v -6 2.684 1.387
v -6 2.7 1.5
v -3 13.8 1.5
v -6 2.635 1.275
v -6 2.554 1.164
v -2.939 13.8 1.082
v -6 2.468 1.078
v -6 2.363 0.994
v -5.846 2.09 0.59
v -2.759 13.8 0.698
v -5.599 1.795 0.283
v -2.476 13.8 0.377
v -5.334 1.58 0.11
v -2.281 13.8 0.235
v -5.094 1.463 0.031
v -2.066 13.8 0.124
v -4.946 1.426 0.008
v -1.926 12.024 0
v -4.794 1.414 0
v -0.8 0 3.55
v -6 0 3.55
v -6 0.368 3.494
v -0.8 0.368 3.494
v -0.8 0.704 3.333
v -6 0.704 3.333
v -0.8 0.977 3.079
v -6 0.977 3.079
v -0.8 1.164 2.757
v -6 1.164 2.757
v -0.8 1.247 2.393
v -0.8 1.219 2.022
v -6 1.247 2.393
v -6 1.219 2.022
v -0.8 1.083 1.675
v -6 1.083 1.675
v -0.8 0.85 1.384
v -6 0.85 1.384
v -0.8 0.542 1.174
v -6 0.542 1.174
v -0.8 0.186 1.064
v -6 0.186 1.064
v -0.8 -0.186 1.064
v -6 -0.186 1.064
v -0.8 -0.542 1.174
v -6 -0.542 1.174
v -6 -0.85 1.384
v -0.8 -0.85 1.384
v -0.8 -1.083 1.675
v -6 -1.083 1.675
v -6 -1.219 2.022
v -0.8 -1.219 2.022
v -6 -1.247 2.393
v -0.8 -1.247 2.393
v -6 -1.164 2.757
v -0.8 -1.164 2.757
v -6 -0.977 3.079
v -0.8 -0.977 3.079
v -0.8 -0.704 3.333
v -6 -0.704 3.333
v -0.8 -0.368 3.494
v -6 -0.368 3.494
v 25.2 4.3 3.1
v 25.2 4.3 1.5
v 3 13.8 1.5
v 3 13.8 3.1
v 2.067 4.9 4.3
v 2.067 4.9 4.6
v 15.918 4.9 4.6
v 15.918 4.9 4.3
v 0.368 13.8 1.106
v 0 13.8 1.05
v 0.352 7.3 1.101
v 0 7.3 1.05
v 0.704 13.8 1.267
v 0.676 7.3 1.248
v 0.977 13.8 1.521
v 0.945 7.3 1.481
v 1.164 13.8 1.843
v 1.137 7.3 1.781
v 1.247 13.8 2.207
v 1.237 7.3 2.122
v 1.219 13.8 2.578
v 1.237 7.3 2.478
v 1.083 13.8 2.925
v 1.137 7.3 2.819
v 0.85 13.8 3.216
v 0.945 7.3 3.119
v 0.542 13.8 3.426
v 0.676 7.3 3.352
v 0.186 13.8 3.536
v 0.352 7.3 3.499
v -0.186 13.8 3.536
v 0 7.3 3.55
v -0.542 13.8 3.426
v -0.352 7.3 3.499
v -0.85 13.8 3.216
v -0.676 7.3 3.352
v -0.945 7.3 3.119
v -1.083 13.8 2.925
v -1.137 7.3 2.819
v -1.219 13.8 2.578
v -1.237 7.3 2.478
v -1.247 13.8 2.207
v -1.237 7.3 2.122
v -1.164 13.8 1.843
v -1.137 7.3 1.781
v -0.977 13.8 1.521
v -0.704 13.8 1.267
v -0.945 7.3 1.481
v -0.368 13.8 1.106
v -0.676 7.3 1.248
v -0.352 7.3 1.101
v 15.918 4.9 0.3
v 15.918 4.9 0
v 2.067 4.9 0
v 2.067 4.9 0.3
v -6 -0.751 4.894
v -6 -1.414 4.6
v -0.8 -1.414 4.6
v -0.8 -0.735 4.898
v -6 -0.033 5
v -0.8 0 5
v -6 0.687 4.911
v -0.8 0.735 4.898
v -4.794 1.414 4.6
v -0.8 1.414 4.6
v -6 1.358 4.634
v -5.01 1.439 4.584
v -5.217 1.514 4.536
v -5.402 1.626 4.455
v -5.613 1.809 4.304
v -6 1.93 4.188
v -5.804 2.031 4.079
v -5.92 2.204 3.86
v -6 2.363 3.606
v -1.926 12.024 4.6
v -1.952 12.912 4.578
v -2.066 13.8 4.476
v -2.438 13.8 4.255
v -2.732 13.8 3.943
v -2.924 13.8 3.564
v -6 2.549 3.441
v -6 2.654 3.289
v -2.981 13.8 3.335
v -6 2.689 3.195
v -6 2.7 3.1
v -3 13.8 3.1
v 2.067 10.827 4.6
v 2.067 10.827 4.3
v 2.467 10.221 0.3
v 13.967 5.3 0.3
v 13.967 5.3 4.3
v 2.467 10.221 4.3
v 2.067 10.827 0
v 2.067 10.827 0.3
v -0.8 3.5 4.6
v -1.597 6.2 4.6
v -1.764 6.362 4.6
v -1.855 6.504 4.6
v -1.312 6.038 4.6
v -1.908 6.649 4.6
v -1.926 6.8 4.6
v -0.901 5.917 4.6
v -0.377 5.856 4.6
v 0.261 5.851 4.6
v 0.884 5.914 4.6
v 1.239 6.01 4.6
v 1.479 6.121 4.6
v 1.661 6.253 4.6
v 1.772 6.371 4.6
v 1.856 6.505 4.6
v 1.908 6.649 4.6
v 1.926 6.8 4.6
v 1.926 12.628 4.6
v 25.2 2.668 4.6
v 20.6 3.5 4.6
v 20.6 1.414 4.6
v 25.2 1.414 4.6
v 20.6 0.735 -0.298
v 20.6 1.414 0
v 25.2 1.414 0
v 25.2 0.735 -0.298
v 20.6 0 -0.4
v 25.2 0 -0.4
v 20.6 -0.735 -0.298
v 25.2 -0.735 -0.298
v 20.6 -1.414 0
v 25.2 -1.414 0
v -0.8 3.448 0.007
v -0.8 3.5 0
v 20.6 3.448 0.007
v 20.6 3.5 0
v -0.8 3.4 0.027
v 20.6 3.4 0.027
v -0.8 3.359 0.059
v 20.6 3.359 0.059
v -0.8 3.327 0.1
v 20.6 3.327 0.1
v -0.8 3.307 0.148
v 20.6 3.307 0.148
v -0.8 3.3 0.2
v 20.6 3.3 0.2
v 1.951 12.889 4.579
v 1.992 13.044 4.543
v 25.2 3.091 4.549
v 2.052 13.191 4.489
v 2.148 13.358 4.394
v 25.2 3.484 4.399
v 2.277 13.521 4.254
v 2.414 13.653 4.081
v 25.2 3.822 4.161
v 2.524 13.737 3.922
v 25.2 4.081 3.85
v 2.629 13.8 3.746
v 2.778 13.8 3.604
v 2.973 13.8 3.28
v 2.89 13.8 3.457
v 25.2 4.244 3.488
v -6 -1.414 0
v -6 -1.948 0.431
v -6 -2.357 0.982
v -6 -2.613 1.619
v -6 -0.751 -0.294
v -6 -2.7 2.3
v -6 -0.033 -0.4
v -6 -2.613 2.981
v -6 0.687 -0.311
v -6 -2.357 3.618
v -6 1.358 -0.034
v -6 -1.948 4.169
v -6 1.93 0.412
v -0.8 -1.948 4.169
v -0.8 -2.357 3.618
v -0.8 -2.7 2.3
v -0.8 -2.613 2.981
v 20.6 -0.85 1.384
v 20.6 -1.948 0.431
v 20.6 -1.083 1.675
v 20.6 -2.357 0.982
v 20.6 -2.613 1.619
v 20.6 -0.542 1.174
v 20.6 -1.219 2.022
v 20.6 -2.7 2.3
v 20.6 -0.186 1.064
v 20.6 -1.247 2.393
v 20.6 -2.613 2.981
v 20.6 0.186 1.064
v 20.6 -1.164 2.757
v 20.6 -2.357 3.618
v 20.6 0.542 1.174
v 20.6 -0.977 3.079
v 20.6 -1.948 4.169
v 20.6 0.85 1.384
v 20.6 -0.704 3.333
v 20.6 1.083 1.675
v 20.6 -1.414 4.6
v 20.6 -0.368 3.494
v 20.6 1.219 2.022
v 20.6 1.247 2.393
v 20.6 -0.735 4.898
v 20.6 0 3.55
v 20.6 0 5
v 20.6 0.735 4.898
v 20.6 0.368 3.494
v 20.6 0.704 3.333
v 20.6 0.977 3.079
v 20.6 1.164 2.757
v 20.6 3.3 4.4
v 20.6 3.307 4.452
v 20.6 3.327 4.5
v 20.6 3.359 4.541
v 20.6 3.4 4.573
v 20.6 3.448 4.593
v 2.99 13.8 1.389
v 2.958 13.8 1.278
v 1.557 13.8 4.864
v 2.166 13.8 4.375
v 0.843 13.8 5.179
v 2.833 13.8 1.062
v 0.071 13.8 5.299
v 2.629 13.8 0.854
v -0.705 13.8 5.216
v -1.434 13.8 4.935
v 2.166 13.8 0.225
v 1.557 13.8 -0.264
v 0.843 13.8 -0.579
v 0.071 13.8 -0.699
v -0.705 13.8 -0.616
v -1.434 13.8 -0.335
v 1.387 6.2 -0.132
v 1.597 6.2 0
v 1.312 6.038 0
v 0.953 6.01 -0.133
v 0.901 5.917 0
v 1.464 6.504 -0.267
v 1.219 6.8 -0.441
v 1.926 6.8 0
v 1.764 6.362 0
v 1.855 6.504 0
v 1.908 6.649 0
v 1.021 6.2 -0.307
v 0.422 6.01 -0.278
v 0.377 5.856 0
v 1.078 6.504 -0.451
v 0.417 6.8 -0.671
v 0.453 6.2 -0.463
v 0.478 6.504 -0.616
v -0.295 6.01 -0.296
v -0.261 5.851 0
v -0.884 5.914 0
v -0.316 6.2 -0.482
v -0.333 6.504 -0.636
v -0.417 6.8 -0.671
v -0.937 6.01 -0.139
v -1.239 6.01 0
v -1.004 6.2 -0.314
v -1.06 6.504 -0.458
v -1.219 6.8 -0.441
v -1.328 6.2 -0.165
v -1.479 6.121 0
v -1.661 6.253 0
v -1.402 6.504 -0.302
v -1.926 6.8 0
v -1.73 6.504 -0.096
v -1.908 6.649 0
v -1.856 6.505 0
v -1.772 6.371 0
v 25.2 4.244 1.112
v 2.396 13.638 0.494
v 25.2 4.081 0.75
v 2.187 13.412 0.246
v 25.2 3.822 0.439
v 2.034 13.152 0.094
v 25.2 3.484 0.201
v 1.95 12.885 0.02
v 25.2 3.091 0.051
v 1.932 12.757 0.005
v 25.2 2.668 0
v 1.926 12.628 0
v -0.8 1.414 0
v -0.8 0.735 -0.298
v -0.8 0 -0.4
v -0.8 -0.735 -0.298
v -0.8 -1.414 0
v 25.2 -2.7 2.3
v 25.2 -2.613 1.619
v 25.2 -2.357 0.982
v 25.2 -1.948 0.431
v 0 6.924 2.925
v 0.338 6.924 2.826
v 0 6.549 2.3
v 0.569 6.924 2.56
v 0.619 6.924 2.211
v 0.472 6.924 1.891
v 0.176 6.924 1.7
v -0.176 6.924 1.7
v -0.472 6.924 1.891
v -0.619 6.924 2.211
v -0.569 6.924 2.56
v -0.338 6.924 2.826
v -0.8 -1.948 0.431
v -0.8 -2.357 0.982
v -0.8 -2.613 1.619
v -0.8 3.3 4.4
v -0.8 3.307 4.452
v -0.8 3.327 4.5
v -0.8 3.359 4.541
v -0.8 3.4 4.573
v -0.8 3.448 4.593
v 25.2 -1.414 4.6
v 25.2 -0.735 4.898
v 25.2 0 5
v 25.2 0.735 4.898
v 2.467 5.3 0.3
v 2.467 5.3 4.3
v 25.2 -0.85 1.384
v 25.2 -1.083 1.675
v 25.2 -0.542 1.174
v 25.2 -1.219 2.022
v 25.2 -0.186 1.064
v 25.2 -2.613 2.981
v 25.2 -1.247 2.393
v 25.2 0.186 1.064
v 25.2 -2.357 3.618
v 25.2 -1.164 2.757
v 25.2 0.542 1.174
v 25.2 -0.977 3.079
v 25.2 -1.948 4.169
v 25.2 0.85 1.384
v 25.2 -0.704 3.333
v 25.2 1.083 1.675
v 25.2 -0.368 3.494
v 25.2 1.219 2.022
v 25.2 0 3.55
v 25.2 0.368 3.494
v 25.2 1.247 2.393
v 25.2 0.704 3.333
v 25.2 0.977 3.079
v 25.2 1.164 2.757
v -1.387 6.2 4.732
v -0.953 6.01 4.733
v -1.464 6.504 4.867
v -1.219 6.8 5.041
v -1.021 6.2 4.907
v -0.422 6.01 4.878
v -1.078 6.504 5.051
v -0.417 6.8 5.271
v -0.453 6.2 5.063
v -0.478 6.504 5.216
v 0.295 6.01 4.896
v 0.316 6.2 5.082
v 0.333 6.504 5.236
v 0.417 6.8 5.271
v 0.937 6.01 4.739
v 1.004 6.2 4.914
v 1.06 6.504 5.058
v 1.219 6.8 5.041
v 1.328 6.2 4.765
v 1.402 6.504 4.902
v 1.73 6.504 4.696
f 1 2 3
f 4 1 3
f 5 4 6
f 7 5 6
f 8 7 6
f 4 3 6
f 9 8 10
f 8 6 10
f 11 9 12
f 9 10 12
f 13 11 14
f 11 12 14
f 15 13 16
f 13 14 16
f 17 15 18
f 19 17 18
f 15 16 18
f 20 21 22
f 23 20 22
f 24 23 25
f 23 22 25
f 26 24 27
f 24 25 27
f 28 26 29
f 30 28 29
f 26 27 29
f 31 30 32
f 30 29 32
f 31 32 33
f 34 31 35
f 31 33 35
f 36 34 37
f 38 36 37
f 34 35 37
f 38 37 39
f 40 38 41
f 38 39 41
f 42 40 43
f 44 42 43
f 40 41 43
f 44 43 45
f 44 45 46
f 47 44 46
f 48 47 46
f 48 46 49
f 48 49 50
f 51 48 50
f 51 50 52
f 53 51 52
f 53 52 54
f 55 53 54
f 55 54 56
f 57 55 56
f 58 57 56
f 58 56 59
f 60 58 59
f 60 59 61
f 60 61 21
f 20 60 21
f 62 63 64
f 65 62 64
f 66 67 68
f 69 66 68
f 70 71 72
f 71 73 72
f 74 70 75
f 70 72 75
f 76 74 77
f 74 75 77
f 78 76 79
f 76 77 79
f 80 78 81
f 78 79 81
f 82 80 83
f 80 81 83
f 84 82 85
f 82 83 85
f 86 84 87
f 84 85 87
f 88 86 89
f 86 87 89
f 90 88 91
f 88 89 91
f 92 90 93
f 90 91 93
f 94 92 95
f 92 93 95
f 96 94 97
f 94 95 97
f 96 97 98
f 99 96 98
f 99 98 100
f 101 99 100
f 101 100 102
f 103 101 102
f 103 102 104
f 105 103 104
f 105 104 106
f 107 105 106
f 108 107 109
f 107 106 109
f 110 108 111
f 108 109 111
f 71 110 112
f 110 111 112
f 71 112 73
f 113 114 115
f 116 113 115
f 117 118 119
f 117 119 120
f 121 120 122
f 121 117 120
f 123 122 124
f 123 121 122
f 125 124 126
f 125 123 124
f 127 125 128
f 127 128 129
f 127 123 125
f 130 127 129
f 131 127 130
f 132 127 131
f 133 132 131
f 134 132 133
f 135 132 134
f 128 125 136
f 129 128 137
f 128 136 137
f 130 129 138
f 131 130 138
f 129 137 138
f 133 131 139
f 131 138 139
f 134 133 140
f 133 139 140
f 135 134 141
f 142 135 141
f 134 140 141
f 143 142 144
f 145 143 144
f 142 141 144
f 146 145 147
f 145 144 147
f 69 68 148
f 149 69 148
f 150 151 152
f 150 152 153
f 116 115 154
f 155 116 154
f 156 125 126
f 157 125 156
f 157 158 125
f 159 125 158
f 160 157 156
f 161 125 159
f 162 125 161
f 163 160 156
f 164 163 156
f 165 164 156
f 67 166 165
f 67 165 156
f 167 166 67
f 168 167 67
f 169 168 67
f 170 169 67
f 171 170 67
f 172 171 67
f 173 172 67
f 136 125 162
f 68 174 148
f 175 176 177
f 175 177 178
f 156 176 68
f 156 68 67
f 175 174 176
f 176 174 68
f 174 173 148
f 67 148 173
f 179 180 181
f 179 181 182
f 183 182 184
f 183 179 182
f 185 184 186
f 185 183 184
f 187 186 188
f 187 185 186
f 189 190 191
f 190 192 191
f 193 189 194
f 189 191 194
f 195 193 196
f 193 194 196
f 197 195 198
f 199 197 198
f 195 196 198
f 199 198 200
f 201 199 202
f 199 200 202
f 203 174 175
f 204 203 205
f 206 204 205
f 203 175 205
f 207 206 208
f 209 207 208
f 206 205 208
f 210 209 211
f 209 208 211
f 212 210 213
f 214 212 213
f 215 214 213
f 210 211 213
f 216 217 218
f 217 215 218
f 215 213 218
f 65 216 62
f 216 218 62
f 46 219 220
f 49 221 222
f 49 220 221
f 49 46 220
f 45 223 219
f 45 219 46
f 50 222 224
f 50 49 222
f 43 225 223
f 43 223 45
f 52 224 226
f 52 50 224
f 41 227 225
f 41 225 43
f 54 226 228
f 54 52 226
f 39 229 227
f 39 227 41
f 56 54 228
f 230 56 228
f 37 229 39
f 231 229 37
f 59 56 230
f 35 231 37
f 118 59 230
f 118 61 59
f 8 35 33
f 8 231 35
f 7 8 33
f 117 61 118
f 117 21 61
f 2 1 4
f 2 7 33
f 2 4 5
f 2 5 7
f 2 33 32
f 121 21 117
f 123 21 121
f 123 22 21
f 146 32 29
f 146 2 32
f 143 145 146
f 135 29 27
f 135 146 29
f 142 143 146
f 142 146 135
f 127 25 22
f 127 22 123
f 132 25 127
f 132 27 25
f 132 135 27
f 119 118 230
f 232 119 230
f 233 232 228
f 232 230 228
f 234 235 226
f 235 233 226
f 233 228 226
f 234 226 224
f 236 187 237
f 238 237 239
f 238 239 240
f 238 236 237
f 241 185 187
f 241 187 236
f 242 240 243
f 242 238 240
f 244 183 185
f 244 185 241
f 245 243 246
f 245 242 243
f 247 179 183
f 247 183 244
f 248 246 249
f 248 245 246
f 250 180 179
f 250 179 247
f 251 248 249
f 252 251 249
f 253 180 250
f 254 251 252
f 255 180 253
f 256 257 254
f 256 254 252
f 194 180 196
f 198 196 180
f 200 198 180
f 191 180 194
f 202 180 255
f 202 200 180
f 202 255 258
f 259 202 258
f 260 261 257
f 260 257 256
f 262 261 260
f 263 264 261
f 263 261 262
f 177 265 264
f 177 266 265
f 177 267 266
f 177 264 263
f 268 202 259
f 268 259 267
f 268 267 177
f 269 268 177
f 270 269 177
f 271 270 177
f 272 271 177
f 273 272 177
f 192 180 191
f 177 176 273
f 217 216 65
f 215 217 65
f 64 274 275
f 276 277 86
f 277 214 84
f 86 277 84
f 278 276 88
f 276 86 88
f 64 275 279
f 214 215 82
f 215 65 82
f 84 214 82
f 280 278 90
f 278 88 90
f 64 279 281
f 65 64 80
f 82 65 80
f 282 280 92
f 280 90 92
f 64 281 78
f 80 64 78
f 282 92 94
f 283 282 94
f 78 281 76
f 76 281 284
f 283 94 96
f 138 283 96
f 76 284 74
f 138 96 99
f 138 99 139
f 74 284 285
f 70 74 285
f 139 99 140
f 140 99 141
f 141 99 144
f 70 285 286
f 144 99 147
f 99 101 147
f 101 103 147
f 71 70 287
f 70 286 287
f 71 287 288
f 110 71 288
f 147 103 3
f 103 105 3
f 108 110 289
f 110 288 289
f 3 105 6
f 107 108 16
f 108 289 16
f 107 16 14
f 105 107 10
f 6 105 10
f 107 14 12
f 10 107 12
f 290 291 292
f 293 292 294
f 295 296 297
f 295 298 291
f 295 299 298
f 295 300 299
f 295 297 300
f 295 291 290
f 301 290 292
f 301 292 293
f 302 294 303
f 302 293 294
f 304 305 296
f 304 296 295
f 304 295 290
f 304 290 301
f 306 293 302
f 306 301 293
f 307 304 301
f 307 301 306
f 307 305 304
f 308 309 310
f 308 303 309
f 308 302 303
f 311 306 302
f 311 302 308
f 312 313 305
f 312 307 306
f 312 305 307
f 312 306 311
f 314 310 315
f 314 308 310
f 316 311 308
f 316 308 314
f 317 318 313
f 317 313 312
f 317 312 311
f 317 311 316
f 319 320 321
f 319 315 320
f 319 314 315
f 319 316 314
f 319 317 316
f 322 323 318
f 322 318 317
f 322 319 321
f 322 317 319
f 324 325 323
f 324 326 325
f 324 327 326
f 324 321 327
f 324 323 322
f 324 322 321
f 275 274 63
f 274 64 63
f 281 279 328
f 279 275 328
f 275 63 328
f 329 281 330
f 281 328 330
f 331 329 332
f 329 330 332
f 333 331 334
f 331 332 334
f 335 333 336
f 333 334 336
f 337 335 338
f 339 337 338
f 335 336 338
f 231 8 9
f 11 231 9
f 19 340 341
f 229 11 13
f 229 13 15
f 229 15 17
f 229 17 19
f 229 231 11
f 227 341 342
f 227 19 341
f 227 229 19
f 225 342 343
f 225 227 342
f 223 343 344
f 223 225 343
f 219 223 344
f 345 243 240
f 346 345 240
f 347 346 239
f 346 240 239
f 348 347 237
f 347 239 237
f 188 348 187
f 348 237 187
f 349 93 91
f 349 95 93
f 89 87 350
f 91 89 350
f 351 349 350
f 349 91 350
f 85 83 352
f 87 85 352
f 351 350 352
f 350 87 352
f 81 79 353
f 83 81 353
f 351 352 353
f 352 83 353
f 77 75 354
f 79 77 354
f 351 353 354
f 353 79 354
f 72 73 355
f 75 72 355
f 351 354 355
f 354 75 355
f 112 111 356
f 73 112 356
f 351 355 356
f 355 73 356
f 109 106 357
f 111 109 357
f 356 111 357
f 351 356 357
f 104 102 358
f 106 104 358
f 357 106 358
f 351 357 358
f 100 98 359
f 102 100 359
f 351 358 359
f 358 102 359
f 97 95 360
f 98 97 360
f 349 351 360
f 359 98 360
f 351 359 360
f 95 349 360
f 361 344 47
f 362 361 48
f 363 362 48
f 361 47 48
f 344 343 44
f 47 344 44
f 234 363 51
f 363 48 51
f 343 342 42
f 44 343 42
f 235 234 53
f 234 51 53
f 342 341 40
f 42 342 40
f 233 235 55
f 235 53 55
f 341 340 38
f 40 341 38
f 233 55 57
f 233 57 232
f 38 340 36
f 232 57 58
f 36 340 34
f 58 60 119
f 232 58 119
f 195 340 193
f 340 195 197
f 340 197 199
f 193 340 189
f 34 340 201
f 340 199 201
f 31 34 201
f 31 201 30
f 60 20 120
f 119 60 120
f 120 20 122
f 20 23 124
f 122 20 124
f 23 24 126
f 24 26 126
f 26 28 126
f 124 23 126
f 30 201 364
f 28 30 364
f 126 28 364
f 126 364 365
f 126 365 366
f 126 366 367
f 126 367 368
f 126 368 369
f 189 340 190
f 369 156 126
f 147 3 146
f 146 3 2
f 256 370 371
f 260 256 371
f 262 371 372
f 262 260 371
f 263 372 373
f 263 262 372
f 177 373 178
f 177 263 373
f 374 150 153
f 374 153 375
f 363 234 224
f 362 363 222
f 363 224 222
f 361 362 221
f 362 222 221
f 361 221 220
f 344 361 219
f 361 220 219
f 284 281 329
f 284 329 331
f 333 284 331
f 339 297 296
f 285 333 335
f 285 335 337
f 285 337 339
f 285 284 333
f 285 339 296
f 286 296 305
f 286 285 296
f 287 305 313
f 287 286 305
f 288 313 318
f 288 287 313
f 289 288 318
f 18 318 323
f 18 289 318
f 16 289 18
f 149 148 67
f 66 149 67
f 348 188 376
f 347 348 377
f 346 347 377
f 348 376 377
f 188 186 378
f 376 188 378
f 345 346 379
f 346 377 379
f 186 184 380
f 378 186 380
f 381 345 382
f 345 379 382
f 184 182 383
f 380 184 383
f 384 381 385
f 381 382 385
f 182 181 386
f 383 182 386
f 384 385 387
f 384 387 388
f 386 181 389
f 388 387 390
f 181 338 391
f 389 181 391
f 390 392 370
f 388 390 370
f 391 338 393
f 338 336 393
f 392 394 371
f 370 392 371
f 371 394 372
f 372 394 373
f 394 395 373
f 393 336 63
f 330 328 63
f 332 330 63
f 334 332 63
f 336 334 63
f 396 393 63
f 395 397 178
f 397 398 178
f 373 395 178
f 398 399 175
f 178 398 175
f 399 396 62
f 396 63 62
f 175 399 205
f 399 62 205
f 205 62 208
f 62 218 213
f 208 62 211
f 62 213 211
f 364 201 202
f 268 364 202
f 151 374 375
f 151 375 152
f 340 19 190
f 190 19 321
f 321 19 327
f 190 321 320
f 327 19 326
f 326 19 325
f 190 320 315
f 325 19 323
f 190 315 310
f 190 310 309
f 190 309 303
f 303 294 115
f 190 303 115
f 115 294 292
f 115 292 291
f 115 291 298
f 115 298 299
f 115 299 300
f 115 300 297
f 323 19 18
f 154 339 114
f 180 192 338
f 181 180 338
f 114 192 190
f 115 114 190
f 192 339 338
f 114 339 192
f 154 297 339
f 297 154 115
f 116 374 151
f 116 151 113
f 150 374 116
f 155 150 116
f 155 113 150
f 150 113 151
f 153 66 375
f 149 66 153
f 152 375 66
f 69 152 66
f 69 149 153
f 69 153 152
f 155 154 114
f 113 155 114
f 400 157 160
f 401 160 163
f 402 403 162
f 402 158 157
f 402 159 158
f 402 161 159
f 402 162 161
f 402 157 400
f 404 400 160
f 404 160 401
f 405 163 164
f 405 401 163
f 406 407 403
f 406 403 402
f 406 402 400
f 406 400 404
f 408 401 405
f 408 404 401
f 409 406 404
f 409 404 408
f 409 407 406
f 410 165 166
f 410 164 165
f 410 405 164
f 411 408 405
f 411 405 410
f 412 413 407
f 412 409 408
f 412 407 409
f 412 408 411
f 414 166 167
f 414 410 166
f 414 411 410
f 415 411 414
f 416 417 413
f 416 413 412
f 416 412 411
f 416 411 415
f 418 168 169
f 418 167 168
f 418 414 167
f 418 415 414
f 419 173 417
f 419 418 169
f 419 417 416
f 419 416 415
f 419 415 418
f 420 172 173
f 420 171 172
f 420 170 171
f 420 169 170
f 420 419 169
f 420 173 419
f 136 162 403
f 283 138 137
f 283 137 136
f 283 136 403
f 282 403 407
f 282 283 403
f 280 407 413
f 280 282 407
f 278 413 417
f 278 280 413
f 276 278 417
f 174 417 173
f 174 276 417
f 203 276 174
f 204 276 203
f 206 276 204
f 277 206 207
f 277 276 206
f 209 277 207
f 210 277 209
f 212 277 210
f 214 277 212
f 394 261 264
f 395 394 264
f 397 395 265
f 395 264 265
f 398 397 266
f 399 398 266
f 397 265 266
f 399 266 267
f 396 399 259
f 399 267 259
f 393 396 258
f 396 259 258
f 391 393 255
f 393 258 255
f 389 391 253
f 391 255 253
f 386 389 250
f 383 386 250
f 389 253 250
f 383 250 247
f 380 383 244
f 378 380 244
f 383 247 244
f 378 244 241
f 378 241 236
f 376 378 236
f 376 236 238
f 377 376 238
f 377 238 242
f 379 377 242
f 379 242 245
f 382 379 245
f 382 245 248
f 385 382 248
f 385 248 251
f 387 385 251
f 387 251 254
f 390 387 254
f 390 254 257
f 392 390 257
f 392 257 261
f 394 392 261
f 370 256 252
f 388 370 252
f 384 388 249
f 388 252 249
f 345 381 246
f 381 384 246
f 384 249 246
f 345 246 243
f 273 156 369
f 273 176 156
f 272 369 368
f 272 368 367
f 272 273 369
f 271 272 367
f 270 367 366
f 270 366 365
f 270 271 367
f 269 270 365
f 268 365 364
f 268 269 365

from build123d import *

# Parameters (mm, degrees)
EXTRUDE_1_DEPTH        = 4.6
SKETCH_2_R             = 3
EXTRUDE_2_DEPTH        = 8
SKETCH_3_R             = 2.7
EXTRUDE_3_DEPTH        = 5.2
SKETCH_5_R             = 2.7
EXTRUDE_4_DEPTH        = 4.6
CUT_EXTRUDE_1_DEPTH    = 35.524918537
FILLET_1_R             = 1.5
CUT_EXTRUDE_2_DEPTH    = 30.215920451
CUT_EXTRUDE_3_DEPTH    = 0.3
CUT_EXTRUDE_4_DEPTH    = 0.3
FILLET_2_R             = 0.2
FILLET_3_R             = 1
SKETCH_9_R             = 1.25
CUT_EXTRUDE_5_DEPTH    = 35.524918683
HOLE_WIZARD_M3_1_D     = 2.5
HOLE_WIZARD_M3_1_DEPTH = 6.5
HOLE_WIZARD_M3_1_TIP   = 0.751075774


with BuildPart() as part:
    # 草图1 → 凸台-拉伸1 (new body)
    with BuildSketch(Plane.XY):
        Polygon((-0.8, -2.7), (-0.8, 3.3), (20.6, 3.3), (20.6, -2.7), (25.2, -2.7), (25.2, 4.3), (3, 13.8), (-3, 13.8), (-6, 2.7), (-6, -2.7), align=None)
        Polygon((2.46680021, 10.221171171), (2.46680021, 5.3), (13.96680021, 5.3), align=None, mode=Mode.SUBTRACT)
    extrude(amount=EXTRUDE_1_DEPTH)

    # 草图2 → 凸台-拉伸2 (add)
    with BuildSketch(Plane(origin=(0, 13.8, 0), x_dir=(1, 0, 0), z_dir=(0, 1, 0))):
        with Locations((0, -2.3)):
            Circle(SKETCH_2_R)
    extrude(amount=-EXTRUDE_2_DEPTH)

    # 草图3 → 凸台-拉伸3 (add)
    with BuildSketch(Plane.ZY.offset(6)):
        with Locations((2.3, 0)):
            Circle(SKETCH_3_R)
    extrude(amount=-EXTRUDE_3_DEPTH)

    # 草图5 → 凸台-拉伸4 (add)
    with BuildSketch(Plane.ZY.offset(-20.6)):
        with Locations((2.3, 0)):
            Circle(SKETCH_5_R)
    extrude(amount=-EXTRUDE_4_DEPTH)

    # 草图4 → 切除-拉伸1 (cut, through all)
    with BuildSketch(Plane.ZY.offset(6)):
        with BuildLine():
            ThreePointArc((4.6, -1.414213562), (3.617502065, -2.356732549), (2.3, -2.7))
            Line((2.3, -2.7), (4.6, -2.7))
            Line((4.6, -2.7), (4.6, -1.414213562))
        make_face()
        with BuildLine():
            ThreePointArc((2.3, -2.7), (0.982497935, -2.356732549), (0, -1.414213562))
            Line((0, -1.414213562), (0, -2.7))
            Line((0, -2.7), (2.3, -2.7))
        make_face()
    extrude(amount=-CUT_EXTRUDE_1_DEPTH, mode=Mode.SUBTRACT)

    # 圆角1
    # the kernel refuses this fillet: 1.5 mm, written as the material it takes off along each edge
    with BuildSketch(Plane(origin=(-2.021591156, 17.420112724, 0), x_dir=(0.9653633930282662, -0.26090902514277475, 0), z_dir=(-0.2609090251427748, -0.9653633930282663, 0))) as fillet_1_piece_1_section:
        with BuildLine():
            CenterArc((FILLET_1_R, FILLET_1_R), FILLET_1_R, 180, 90)
            Line((0, FILLET_1_R), (0, 0))
            Line((0, 0), (FILLET_1_R, 0))
        make_face()
    fillet_1_piece_1 = extrude(amount=18.998260738, mode=Mode.PRIVATE)
    fillet_1_piece_1 = fillet_1_piece_1 - Plane(origin=(-4.247071053, 0, 2.3), x_dir=(0, 0, 1), z_dir=(-1, 0, 0)) * Cylinder(2.7, 44, mode=Mode.PRIVATE)
    fillet_1_piece_1 = fillet_1_piece_1 - Plane(origin=(0, 7.876054914, 2.3), x_dir=(1, 0, 0), z_dir=(0, 1, 0)) * Cylinder(3, 44, mode=Mode.PRIVATE)
    add(fillet_1_piece_1, mode=Mode.SUBTRACT)
    with BuildSketch(Plane(origin=(-2.021591156, 17.420112724, 4.6), x_dir=(0.9653633930282662, -0.26090902514277475, 0), z_dir=(-0.2609090251427748, -0.9653633930282663, 0))) as fillet_1_piece_2_section:
        with BuildLine():
            CenterArc((FILLET_1_R, -FILLET_1_R), FILLET_1_R, 90, 90)
            Line((0, -FILLET_1_R), (0, 0))
            Line((0, 0), (FILLET_1_R, 0))
        make_face()
    fillet_1_piece_2 = extrude(amount=18.998260738, mode=Mode.PRIVATE)
    fillet_1_piece_2 = fillet_1_piece_2 - Plane(origin=(-4.247069139, 0, 2.3), x_dir=(0, 0, 1), z_dir=(-1, 0, 0)) * Cylinder(2.7, 44, mode=Mode.PRIVATE)
    fillet_1_piece_2 = fillet_1_piece_2 - Plane(origin=(0, 7.876066276, 2.3), x_dir=(1, 0, 0), z_dir=(0, 1, 0)) * Cylinder(3, 44, mode=Mode.PRIVATE)
    add(fillet_1_piece_2, mode=Mode.SUBTRACT)
    with BuildSketch(Plane(origin=(28.647596614, 2.824677125, 0), x_dir=(-0.39341943343746105, -0.9193590970854355, 0), z_dir=(-0.9193590970854355, 0.39341943343746105, 0))) as fillet_1_piece_3_section:
        with BuildLine():
            CenterArc((FILLET_1_R, FILLET_1_R), FILLET_1_R, 180, 90)
            Line((0, FILLET_1_R), (0, 0))
            Line((0, 0), (FILLET_1_R, 0))
        make_face()
    fillet_1_piece_3 = extrude(amount=31.647256573, mode=Mode.PRIVATE)
    fillet_1_piece_3 = fillet_1_piece_3 - Plane(origin=(0, 8.805883363, 2.3), x_dir=(1, 0, 0), z_dir=(0, 1, 0)) * Cylinder(3, 70, mode=Mode.PRIVATE)
    add(fillet_1_piece_3, mode=Mode.SUBTRACT)
    with BuildSketch(Plane(origin=(28.647596614, 2.824677125, 4.6), x_dir=(-0.39341943343746105, -0.9193590970854355, 0), z_dir=(-0.9193590970854355, 0.39341943343746105, 0))) as fillet_1_piece_4_section:
        with BuildLine():
            CenterArc((FILLET_1_R, -FILLET_1_R), FILLET_1_R, 90, 90)
            Line((0, -FILLET_1_R), (0, 0))
            Line((0, 0), (FILLET_1_R, 0))
        make_face()
    fillet_1_piece_4 = extrude(amount=31.647256573, mode=Mode.PRIVATE)
    fillet_1_piece_4 = fillet_1_piece_4 - Plane(origin=(0, 8.805887847, 2.3), x_dir=(1, 0, 0), z_dir=(0, 1, 0)) * Cylinder(3, 70, mode=Mode.PRIVATE)
    add(fillet_1_piece_4, mode=Mode.SUBTRACT)

    # 草图6 → 切除-拉伸2 (cut, through all)
    with BuildSketch(Plane.XY.offset(4.6)):
        Polygon((13.96680021, 5.3), (2.46680021, 10.221171171), (2.46680021, 5.3), align=None)
    extrude(amount=-CUT_EXTRUDE_2_DEPTH, mode=Mode.SUBTRACT)

    # 草图7 → 切除-拉伸3 (cut)
    with BuildSketch(Plane.XY.offset(4.6)):
        Polygon((2.06680021, 10.827428046), (2.06680021, 4.9), (15.918263645, 4.9), align=None)
        Polygon((2.46680021, 10.221171171), (2.46680021, 5.3), (13.96680021, 5.3), align=None, mode=Mode.SUBTRACT)
    extrude(amount=-CUT_EXTRUDE_3_DEPTH, mode=Mode.SUBTRACT)

    # 草图8 → 切除-拉伸4 (cut)
    with BuildSketch(Plane(origin=(0, 0, 0), x_dir=(-1, 0, 0), z_dir=(0, 0, -1))):
        Polygon((-2.06680021, 4.9), (-2.06680021, 10.827428046), (-15.918263645, 4.9), align=None)
        Polygon((-2.46680021, 5.3), (-2.46680021, 10.221171171), (-13.96680021, 5.3), align=None, mode=Mode.SUBTRACT)
    extrude(amount=-CUT_EXTRUDE_4_DEPTH, mode=Mode.SUBTRACT)

    # 圆角2
    fillet_2_edges = [part.edges().sort_by_distance(p)[0] for p in [
        (9.9, 3.3, 4.6),
        (9.9, 3.3, 0),
    ]]
    fillet(fillet_2_edges, radius=FILLET_2_R)

    # 圆角3
    # the kernel refuses this fillet: 1 mm, written as the material it takes off along each edge
    with BuildSketch(Plane(origin=(0, 5.8, 2.3), x_dir=(-0.9991986620043835, 0, 0.040025415034074786), z_dir=(-0.040025415034074786, 0, -0.9991986620043835))) as fillet_3_piece_1_section:
        with BuildLine():
            CenterArc((3 - FILLET_3_R, FILLET_3_R), FILLET_3_R, 270, 90)
            Line((3 - FILLET_3_R, 0), (3, 0))
            Line((3, 0), (3, FILLET_3_R))
        make_face()
    fillet_3_piece_1 = revolve(axis=Axis((0, 5.8, 2.3), (0, 1, 0)), revolution_arc=175.412199766, mode=Mode.PRIVATE)
    fillet_3_piece_1 = split(fillet_3_piece_1, bisect_by=Plane(origin=(0, 6.202737669, 4.6), z_dir=(0, 0, 1)), keep=Keep.TOP, mode=Mode.PRIVATE)
    add(fillet_3_piece_1, mode=Mode.SUBTRACT)
    with BuildSketch(Plane(origin=(0, 5.8, 2.3), x_dir=(0.9991986620043835, 0, -0.04002541503407598), z_dir=(0.04002541503407598, 0, 0.9991986620043835))) as fillet_3_piece_2_section:
        with BuildLine():
            CenterArc((3 - FILLET_3_R, FILLET_3_R), FILLET_3_R, 270, 90)
            Line((3 - FILLET_3_R, 0), (3, 0))
            Line((3, 0), (3, FILLET_3_R))
        make_face()
    fillet_3_piece_2 = revolve(axis=Axis((0, 5.8, 2.3), (0, 1, 0)), revolution_arc=175.412199766, mode=Mode.PRIVATE)
    fillet_3_piece_2 = split(fillet_3_piece_2, bisect_by=Plane(origin=(0, 6.202737669, 0), z_dir=(0, 0, -1)), keep=Keep.TOP, mode=Mode.PRIVATE)
    add(fillet_3_piece_2, mode=Mode.SUBTRACT)

    # 草图9 → 切除-拉伸5 (cut, through all)
    with BuildSketch(Plane.ZY.offset(6)):
        with Locations((2.3, 0)):
            Circle(SKETCH_9_R)
    extrude(amount=-CUT_EXTRUDE_5_DEPTH, mode=Mode.SUBTRACT)

    # M3 螺纹孔1
    with Locations(Plane(origin=(0, 13.8, 2.3), x_dir=(0, 0, 1), z_dir=(0, 1, 0))):
        with Locations((0, 0)):
            Hole(HOLE_WIZARD_M3_1_D / 2, depth=HOLE_WIZARD_M3_1_DEPTH)
            with Locations((0, 0, -(HOLE_WIZARD_M3_1_DEPTH + HOLE_WIZARD_M3_1_TIP / 2))):  # 118° drill point
                Cone(0, HOLE_WIZARD_M3_1_D / 2, HOLE_WIZARD_M3_1_TIP, mode=Mode.SUBTRACT)


solid = part.part
